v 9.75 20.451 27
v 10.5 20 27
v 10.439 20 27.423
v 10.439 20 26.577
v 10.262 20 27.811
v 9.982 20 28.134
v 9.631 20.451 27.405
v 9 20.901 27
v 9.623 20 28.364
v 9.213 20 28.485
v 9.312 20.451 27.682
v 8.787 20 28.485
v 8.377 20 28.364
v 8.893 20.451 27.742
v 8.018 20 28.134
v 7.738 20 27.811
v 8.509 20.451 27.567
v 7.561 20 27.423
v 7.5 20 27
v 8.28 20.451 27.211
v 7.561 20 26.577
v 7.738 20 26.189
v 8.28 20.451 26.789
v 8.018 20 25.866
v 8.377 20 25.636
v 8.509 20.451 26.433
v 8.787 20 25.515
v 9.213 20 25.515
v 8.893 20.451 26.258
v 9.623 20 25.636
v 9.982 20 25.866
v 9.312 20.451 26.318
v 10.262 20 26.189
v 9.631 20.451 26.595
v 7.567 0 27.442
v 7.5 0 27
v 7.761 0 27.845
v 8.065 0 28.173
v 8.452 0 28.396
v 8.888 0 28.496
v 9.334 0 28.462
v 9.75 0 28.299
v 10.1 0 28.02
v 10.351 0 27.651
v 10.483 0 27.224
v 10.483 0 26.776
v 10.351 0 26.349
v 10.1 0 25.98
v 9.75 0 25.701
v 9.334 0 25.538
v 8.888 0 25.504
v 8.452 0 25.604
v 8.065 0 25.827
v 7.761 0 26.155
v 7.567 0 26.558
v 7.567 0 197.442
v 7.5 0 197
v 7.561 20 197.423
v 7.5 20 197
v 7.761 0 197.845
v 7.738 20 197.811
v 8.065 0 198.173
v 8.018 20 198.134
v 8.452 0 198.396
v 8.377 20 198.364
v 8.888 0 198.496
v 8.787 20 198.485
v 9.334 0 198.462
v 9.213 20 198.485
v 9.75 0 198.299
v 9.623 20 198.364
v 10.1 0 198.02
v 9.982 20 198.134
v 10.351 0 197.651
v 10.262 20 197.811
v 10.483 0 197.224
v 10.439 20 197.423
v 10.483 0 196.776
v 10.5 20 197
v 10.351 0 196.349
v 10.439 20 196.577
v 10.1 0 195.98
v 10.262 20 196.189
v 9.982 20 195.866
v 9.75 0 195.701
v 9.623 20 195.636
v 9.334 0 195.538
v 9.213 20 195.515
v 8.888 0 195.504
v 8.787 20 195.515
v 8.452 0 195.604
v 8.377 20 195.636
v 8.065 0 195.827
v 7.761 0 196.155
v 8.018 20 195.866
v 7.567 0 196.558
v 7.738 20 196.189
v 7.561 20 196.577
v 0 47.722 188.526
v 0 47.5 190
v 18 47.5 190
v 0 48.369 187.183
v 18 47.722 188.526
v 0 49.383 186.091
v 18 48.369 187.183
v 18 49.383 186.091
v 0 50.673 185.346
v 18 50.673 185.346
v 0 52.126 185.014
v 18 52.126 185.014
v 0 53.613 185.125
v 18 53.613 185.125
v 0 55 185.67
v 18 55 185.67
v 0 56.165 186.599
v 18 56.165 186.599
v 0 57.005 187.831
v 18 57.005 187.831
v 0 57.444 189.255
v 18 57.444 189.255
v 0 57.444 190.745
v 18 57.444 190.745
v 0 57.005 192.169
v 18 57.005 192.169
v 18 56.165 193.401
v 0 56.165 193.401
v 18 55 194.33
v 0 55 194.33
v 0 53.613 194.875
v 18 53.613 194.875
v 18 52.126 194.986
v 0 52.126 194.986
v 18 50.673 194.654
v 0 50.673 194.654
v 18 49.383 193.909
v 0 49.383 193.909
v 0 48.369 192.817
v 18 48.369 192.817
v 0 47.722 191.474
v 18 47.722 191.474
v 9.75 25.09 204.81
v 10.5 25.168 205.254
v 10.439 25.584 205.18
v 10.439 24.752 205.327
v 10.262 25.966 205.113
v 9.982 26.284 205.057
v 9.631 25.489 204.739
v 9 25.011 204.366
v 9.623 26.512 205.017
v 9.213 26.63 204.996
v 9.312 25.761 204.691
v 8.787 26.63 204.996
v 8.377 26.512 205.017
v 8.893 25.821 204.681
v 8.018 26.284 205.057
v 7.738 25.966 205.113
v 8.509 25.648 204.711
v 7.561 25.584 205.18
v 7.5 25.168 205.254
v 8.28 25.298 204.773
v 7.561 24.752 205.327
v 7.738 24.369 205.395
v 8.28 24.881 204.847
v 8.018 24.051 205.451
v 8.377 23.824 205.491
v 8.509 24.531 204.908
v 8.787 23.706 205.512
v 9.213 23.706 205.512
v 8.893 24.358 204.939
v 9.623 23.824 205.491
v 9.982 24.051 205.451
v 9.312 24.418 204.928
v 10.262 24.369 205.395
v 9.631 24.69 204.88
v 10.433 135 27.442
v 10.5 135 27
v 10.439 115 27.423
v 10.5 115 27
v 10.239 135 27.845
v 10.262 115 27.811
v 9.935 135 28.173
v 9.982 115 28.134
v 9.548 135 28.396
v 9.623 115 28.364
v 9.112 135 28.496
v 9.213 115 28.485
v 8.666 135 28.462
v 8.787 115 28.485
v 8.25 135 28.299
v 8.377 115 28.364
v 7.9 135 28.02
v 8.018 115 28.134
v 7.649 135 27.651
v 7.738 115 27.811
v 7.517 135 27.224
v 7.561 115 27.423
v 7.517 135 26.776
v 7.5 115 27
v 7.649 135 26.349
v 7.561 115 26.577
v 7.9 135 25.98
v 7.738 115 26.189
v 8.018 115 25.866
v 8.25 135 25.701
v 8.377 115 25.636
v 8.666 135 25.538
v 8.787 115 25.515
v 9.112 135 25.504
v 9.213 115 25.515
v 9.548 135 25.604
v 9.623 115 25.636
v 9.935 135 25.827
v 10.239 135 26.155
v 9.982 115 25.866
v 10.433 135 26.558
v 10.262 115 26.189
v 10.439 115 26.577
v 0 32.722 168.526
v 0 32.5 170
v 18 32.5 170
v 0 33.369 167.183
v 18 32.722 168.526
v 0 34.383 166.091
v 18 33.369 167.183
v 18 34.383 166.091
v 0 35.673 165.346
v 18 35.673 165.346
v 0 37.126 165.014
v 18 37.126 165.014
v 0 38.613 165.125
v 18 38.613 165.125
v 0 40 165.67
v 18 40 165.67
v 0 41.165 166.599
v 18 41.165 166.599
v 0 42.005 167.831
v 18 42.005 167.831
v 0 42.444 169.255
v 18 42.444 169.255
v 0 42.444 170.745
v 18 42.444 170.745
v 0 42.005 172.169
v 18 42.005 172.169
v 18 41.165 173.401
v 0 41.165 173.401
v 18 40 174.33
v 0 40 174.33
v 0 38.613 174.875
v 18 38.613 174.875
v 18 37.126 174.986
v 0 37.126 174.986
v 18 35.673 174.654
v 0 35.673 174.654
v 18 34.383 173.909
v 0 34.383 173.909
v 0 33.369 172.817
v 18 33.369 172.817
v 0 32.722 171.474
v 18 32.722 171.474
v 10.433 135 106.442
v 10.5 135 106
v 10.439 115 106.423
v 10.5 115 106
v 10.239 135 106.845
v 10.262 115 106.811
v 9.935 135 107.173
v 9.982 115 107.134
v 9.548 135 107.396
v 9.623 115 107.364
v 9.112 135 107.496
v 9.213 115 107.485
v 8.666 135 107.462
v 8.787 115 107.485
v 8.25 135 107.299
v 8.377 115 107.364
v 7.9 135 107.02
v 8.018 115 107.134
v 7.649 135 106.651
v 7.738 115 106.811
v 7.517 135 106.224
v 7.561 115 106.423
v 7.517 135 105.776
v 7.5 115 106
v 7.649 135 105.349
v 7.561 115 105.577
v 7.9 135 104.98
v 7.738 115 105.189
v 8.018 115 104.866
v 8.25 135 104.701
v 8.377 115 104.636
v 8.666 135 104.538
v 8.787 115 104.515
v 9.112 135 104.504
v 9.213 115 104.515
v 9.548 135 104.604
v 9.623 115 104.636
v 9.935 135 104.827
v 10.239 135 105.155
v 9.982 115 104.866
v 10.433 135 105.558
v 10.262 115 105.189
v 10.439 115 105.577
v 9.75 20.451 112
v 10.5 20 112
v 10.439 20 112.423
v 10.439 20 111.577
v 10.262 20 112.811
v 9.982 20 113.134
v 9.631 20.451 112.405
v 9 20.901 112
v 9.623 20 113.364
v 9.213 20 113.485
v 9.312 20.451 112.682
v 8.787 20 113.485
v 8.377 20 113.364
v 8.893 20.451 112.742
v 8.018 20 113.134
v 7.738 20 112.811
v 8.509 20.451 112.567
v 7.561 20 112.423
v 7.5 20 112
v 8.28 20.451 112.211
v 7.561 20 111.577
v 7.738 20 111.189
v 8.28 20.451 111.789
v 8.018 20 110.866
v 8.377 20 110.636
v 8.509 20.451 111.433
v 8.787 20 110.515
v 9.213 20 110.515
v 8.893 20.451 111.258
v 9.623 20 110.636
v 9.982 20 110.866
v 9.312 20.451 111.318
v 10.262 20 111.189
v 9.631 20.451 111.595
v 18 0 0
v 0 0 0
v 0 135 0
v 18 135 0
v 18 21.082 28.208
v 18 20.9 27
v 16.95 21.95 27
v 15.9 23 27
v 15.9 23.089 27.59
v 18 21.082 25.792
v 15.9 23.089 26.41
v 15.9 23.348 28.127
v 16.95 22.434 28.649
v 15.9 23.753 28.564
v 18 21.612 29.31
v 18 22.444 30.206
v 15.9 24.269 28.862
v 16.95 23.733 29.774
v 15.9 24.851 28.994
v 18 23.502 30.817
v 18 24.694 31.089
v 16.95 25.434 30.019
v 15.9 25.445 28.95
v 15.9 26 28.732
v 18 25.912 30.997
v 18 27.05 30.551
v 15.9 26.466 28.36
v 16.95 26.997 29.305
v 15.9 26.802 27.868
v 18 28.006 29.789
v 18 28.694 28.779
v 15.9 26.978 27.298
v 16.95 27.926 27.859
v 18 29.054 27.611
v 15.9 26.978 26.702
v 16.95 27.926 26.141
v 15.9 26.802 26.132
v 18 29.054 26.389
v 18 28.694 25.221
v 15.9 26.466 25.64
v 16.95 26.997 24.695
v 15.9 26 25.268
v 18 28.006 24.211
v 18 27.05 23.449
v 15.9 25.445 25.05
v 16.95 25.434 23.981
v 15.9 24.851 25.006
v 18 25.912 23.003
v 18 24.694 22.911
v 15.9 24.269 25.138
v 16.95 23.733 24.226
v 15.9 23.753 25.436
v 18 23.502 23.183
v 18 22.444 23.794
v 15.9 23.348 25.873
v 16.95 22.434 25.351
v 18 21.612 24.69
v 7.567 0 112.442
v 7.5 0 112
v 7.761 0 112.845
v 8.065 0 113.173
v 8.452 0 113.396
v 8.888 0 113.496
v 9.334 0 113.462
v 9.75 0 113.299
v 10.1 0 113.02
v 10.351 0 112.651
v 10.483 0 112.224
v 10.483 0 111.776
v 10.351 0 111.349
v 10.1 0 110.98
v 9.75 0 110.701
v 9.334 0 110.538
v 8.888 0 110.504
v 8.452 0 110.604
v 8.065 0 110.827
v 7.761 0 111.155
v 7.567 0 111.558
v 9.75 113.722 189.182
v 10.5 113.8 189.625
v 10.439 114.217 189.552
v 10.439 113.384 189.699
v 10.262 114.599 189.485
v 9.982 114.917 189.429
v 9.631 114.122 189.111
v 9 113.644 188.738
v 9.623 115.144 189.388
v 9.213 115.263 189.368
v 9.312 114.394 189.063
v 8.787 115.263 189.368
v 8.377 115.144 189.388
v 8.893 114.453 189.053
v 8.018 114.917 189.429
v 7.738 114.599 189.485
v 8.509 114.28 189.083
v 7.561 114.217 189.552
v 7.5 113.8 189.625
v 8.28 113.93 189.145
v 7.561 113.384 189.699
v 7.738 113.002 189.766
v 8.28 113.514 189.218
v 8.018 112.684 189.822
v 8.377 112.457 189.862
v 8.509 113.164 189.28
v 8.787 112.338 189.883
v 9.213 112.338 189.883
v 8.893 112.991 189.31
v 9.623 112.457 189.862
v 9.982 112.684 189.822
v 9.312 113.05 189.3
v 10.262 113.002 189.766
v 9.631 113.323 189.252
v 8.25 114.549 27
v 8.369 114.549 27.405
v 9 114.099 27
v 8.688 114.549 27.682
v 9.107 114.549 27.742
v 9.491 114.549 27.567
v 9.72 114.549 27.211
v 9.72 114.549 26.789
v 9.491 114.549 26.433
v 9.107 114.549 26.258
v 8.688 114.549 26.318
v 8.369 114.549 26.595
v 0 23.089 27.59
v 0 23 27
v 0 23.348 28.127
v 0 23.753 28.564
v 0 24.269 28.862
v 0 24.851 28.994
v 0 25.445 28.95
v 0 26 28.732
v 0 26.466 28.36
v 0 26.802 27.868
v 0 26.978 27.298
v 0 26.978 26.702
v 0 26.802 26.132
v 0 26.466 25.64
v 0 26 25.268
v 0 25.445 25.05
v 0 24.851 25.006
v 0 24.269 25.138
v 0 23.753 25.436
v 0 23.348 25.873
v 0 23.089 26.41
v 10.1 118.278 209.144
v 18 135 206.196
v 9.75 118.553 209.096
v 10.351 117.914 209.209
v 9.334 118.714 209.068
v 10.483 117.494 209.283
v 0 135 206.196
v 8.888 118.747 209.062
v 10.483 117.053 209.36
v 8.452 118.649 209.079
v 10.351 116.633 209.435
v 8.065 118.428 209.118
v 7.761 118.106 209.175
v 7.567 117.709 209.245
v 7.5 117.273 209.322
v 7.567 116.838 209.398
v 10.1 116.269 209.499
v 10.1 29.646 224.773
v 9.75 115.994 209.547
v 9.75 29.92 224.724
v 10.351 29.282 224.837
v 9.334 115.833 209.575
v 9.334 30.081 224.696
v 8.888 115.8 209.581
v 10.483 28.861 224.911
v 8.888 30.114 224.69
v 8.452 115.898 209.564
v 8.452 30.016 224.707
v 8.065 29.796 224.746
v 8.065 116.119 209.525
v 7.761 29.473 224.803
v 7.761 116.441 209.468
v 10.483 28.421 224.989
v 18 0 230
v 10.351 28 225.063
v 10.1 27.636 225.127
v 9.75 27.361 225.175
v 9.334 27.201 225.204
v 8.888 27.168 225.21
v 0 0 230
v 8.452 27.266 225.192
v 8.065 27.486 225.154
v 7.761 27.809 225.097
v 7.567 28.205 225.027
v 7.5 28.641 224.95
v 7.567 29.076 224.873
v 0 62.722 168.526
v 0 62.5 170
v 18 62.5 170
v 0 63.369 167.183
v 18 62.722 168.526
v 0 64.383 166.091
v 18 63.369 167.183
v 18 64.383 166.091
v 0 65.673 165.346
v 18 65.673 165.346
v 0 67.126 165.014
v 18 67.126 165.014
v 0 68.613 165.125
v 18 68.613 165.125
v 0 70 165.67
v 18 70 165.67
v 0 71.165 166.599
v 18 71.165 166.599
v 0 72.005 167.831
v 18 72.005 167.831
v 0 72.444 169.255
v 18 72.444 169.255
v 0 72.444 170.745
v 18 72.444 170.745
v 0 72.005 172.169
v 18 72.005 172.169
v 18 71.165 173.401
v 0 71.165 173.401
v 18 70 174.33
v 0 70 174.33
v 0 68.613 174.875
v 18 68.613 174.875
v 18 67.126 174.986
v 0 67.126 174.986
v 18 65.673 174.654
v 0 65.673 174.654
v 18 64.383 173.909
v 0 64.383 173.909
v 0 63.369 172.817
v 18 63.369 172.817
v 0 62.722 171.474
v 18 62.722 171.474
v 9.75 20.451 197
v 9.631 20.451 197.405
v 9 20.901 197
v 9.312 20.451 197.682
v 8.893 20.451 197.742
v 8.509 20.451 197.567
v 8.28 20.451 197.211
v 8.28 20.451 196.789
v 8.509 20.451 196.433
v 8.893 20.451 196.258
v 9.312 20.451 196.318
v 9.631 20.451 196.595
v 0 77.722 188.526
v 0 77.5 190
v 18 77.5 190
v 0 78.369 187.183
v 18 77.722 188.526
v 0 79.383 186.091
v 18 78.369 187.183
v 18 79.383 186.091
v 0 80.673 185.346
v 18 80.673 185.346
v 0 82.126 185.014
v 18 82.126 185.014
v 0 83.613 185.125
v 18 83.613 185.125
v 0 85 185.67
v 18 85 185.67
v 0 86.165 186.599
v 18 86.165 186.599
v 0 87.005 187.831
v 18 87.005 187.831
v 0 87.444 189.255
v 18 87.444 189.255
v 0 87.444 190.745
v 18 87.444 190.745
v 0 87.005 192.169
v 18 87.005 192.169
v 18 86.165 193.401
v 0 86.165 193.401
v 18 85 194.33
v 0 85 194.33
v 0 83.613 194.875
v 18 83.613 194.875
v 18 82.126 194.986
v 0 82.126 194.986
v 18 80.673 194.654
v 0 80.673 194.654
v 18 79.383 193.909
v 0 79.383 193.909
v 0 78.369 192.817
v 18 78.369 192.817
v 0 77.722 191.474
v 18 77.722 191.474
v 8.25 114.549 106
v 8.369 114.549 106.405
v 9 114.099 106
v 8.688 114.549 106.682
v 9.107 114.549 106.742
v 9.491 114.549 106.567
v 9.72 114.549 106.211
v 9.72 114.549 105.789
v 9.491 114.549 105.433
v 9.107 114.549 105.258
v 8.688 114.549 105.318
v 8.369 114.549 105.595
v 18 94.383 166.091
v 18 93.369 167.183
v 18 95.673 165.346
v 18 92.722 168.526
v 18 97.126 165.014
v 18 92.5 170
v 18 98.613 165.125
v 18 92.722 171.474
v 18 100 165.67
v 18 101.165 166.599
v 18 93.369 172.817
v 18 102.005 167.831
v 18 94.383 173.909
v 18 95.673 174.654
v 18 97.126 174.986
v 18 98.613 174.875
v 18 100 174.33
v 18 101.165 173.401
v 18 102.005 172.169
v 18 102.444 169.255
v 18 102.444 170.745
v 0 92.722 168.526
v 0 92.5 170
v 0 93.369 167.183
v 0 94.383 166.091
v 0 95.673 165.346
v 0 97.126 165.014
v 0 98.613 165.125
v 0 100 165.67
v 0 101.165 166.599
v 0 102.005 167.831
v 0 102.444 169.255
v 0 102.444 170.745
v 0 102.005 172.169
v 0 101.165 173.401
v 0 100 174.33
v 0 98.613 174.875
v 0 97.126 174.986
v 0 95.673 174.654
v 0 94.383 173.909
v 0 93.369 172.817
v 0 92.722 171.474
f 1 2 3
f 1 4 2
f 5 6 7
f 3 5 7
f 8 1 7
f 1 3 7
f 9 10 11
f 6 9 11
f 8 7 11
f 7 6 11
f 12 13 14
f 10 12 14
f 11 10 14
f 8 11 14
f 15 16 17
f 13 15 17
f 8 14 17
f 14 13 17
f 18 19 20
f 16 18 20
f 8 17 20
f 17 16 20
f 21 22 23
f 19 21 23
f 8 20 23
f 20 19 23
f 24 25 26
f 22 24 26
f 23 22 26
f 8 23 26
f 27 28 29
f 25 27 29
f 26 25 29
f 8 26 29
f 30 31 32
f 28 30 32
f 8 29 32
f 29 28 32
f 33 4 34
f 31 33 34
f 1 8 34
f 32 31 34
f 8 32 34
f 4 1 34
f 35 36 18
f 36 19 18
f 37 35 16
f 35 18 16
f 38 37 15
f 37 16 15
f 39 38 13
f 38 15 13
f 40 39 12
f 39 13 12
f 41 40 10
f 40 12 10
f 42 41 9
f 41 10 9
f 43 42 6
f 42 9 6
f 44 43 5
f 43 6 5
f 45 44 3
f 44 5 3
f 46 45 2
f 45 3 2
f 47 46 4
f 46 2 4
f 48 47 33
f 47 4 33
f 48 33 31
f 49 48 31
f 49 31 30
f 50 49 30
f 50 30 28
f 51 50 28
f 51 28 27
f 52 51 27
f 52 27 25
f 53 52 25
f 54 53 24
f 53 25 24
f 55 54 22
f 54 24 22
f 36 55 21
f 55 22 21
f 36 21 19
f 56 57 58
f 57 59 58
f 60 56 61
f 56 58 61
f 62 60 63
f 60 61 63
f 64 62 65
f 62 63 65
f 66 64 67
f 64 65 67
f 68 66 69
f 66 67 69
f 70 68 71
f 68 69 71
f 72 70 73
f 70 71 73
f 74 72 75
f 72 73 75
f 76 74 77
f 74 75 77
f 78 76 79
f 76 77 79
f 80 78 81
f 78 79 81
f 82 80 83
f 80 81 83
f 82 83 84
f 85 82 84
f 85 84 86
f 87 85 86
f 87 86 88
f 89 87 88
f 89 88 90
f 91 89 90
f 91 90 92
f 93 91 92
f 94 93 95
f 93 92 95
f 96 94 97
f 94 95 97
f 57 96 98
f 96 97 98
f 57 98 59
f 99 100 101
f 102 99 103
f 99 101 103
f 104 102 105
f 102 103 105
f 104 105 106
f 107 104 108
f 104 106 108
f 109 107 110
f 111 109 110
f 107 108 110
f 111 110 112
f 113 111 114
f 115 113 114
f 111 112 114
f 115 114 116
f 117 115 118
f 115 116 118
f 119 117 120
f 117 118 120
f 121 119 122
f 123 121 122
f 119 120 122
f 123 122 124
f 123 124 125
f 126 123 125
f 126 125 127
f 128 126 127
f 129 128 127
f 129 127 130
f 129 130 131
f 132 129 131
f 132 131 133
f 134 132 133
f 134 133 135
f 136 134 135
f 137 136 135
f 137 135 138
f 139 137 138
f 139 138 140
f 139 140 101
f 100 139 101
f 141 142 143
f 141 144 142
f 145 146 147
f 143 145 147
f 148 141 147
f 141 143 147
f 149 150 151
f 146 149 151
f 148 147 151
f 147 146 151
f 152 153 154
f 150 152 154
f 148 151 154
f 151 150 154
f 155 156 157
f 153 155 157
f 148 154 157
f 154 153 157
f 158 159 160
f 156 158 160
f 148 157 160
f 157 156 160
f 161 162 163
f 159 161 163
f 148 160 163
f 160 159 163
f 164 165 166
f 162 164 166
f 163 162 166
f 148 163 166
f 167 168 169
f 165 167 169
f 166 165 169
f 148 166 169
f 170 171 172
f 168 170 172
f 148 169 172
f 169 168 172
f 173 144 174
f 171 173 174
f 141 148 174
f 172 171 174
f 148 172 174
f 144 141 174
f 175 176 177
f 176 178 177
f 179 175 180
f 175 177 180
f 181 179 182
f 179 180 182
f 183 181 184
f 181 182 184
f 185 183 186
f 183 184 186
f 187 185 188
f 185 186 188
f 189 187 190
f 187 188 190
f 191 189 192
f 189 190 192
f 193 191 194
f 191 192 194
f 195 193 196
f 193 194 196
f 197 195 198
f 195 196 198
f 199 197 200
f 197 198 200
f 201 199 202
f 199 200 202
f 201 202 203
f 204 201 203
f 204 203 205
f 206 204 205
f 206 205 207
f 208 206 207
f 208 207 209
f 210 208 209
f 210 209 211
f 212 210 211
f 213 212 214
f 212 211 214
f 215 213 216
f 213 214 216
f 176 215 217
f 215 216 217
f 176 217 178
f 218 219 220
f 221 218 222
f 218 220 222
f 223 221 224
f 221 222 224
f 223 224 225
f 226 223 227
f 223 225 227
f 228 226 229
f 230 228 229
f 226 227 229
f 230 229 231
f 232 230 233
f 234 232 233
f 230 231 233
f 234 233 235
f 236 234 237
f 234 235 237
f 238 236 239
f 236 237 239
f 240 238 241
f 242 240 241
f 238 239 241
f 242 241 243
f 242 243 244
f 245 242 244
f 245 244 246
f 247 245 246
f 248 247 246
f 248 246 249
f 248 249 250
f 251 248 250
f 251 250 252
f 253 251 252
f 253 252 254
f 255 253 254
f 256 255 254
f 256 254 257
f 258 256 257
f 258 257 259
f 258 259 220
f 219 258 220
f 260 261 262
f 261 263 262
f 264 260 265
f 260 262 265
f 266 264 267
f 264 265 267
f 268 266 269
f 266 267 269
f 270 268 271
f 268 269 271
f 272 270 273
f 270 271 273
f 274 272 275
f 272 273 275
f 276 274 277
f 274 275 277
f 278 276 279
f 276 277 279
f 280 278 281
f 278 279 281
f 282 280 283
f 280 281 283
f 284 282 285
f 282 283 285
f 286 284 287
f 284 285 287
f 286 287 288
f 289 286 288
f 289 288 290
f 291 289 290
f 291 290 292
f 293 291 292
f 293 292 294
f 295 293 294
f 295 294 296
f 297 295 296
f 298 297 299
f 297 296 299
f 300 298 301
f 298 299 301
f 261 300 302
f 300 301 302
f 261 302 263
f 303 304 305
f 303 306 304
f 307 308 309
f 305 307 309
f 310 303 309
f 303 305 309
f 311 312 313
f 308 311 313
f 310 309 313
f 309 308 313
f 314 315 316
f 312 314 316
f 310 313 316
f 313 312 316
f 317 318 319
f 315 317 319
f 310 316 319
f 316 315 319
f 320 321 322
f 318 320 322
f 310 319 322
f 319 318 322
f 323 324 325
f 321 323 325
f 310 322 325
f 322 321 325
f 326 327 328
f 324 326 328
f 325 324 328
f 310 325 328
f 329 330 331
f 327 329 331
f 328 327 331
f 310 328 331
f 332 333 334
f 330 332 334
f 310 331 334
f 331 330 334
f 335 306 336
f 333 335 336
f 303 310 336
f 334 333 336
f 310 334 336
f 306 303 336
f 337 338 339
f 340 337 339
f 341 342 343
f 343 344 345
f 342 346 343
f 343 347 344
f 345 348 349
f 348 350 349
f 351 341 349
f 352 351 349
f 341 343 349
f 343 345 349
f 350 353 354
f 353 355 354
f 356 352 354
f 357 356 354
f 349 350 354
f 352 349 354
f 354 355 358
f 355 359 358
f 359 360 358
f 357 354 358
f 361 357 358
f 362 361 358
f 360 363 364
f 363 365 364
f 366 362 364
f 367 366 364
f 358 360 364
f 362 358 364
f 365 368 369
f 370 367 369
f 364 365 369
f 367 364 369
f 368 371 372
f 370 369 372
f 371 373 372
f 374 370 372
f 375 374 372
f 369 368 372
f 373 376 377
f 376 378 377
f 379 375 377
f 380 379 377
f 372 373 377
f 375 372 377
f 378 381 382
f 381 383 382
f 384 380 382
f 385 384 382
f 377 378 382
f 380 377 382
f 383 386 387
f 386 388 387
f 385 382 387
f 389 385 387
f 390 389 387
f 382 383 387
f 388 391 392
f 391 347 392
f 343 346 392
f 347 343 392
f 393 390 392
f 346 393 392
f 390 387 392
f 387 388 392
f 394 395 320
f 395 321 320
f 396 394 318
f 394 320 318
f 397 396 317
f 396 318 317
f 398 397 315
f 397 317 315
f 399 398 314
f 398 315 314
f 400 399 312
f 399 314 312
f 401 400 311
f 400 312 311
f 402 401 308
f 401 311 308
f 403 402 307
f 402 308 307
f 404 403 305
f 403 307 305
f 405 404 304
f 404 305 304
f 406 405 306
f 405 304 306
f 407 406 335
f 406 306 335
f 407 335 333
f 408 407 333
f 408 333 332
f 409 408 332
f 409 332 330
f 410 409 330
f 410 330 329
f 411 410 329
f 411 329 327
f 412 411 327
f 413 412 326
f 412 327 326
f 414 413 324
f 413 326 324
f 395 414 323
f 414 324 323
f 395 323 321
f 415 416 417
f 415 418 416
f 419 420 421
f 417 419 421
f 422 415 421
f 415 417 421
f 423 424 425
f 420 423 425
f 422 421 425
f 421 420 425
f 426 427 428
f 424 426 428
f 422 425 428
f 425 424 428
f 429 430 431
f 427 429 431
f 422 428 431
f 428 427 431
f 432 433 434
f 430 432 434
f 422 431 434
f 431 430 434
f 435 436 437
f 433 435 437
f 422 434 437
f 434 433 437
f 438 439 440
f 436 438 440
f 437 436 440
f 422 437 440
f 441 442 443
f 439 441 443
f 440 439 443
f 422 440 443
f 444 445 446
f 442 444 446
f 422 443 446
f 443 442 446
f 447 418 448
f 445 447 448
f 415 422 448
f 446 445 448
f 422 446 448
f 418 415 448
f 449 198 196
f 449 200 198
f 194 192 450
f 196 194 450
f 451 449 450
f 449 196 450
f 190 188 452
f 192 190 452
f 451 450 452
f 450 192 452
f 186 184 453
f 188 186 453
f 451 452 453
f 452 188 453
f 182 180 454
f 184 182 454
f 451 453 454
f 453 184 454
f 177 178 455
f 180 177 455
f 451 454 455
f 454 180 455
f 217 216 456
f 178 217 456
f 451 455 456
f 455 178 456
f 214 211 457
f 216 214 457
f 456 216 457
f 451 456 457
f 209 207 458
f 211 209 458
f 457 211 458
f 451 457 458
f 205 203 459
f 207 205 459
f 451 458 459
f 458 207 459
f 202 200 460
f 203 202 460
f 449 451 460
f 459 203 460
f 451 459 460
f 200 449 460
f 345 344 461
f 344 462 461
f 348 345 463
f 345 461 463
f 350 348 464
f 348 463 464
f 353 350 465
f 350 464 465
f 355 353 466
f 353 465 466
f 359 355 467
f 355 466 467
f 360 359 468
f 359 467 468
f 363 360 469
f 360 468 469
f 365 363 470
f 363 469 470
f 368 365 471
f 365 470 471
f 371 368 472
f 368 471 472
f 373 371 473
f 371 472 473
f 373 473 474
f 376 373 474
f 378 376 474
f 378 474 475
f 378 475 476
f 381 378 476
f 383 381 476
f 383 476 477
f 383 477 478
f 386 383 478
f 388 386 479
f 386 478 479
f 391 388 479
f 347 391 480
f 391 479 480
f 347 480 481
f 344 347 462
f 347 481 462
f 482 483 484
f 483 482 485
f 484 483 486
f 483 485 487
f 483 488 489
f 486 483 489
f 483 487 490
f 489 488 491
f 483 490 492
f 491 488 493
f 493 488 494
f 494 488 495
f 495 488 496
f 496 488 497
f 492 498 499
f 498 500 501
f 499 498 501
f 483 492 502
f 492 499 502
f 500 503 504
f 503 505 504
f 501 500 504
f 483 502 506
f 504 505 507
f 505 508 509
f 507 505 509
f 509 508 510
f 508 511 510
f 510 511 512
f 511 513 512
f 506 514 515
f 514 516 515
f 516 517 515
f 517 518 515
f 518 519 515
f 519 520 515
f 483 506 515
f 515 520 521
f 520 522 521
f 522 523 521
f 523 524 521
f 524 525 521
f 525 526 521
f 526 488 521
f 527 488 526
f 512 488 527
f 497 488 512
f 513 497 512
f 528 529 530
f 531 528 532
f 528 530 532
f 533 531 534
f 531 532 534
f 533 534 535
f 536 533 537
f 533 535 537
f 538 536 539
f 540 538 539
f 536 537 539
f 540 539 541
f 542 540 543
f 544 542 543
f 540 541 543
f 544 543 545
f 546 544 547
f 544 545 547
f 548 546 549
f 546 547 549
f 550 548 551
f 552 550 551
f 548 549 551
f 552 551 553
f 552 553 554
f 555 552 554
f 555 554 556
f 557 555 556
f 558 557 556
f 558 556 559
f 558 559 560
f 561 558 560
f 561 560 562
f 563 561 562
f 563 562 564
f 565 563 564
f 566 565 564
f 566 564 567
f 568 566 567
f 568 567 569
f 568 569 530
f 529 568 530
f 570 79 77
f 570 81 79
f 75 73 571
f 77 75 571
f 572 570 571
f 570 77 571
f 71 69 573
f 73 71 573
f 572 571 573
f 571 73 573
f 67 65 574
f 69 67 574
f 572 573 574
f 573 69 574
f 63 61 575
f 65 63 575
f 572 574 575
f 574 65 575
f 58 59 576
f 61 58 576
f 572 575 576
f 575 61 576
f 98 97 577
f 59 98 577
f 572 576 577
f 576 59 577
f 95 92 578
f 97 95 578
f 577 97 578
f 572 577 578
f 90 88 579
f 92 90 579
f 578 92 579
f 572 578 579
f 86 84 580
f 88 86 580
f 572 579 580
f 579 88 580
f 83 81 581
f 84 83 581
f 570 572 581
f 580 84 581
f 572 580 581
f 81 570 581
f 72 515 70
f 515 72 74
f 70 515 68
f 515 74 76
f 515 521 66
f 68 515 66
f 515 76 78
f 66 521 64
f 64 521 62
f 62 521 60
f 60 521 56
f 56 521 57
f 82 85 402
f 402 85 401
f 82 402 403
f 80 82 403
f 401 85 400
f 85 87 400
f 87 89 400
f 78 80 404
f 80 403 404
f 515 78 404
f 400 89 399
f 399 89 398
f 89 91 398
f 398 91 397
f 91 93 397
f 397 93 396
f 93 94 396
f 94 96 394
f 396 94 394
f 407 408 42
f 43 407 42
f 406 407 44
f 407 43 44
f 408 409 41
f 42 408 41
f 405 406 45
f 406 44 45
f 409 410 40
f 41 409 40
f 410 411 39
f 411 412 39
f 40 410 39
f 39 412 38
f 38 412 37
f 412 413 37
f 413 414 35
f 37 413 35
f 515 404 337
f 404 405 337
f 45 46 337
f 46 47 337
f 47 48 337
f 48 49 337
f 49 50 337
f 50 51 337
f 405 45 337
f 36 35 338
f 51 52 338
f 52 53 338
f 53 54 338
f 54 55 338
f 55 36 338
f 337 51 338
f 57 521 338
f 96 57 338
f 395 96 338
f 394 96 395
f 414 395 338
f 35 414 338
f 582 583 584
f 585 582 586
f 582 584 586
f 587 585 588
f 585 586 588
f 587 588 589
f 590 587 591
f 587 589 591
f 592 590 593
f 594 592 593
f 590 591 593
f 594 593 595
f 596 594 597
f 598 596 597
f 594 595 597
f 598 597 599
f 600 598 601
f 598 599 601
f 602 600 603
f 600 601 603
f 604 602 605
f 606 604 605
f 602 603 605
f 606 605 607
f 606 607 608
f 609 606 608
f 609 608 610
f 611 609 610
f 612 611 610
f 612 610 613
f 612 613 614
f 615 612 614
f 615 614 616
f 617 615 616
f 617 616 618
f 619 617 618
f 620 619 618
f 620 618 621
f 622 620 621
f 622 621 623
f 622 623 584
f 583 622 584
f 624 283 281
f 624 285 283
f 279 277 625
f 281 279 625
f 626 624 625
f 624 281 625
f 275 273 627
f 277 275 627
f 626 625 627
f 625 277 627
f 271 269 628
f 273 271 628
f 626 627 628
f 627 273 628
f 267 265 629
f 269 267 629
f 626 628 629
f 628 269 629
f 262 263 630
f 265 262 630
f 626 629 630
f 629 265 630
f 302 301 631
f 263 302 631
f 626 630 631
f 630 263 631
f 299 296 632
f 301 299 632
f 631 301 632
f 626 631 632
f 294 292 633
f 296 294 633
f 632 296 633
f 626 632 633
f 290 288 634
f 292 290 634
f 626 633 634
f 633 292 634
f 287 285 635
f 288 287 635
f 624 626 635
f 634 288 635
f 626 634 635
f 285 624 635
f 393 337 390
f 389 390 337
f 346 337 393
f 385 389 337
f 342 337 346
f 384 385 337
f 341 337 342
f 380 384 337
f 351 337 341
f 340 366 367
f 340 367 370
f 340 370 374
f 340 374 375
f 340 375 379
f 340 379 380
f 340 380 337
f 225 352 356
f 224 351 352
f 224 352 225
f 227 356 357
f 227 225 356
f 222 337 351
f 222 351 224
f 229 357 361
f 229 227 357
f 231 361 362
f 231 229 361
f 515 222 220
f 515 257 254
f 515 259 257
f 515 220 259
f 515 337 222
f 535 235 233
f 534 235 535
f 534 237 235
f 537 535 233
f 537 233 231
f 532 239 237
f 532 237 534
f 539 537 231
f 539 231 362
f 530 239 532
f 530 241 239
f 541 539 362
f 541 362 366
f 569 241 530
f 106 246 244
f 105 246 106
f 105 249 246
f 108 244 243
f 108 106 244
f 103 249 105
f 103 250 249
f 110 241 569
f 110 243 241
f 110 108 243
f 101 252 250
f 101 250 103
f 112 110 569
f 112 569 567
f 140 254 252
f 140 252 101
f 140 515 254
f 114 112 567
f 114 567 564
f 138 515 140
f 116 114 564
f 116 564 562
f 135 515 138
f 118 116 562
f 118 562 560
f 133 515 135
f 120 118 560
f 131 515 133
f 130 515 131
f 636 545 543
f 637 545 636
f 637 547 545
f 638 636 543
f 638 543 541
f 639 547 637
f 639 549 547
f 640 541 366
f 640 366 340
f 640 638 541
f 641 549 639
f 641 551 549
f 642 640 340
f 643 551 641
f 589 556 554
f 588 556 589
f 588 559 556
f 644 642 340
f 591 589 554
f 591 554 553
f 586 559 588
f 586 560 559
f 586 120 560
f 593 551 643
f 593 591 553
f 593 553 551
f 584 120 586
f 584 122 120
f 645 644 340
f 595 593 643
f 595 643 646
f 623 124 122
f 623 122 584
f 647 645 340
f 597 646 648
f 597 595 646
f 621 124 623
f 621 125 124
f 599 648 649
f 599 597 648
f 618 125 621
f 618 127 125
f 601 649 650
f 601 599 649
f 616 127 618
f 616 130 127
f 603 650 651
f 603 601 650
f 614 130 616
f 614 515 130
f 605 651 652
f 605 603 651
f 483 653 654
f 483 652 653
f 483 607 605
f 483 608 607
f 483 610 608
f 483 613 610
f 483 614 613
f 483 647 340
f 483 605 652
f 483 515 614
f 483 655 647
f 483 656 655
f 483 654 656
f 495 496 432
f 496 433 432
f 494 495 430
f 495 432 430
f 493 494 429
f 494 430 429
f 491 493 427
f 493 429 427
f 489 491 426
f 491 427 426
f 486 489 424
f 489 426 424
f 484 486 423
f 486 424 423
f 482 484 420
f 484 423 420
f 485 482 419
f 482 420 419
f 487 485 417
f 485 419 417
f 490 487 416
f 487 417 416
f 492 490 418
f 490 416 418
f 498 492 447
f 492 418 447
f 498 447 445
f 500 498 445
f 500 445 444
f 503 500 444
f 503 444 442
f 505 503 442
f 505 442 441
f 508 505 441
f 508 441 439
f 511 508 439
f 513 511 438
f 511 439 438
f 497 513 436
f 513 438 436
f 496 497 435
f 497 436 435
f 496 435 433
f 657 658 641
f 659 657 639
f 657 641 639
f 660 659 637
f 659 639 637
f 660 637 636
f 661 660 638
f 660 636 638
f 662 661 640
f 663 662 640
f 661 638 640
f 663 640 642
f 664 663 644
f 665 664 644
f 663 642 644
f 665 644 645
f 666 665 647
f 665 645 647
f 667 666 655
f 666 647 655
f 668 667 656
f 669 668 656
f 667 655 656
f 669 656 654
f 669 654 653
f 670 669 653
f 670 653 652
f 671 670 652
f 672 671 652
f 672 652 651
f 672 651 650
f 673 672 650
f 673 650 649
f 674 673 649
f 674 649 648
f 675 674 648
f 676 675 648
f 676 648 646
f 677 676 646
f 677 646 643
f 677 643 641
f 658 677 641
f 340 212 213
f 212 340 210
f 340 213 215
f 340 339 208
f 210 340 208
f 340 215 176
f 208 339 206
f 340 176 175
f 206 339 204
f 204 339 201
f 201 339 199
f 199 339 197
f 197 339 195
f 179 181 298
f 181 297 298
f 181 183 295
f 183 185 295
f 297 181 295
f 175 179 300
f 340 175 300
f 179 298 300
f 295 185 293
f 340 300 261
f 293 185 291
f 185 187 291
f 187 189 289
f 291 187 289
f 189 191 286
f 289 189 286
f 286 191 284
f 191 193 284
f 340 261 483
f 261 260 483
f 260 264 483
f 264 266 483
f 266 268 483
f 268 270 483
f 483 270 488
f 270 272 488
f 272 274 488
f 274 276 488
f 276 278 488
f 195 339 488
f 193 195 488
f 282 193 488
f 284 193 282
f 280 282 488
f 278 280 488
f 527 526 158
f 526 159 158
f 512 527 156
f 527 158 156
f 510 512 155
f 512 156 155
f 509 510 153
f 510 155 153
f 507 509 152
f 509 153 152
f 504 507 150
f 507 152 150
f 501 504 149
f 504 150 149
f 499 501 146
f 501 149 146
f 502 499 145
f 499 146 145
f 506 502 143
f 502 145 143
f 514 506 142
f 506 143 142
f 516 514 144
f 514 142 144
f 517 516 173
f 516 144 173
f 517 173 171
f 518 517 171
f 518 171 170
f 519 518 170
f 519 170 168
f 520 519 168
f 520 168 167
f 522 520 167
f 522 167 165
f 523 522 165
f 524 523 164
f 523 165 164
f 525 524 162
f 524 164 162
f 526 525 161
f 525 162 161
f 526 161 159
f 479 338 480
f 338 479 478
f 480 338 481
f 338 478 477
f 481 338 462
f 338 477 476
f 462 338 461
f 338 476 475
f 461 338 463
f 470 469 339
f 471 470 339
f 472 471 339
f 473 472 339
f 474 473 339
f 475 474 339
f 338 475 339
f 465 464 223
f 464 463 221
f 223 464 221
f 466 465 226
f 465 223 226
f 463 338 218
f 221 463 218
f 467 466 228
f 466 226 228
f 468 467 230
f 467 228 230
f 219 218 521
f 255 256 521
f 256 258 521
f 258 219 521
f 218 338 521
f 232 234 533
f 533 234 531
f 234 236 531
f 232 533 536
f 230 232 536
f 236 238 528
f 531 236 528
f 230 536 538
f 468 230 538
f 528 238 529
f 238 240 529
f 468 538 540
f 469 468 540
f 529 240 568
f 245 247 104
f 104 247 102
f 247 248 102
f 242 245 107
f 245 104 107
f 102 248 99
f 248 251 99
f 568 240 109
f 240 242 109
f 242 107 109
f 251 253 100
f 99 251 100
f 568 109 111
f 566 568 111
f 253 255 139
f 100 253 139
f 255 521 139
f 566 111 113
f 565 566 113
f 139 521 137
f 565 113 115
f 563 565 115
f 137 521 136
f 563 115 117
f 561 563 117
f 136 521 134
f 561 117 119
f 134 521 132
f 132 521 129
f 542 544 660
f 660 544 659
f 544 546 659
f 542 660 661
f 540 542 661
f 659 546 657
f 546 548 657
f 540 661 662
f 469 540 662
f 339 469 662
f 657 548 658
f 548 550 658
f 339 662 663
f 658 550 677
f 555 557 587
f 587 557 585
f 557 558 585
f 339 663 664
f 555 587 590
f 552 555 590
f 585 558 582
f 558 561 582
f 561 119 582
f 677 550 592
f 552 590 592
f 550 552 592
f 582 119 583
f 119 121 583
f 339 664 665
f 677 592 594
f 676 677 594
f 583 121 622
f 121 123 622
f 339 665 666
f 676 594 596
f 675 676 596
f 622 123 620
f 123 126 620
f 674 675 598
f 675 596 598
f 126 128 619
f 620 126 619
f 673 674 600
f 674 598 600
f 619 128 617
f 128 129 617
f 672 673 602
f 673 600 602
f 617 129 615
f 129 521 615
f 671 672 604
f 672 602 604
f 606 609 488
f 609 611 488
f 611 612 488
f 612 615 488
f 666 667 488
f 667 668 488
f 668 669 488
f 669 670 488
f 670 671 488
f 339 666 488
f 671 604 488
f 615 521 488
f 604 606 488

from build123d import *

# Parameters (mm, degrees)
F1_DEPTH       = 18
F2_D           = 10
F3_D           = 10
F5_D           = 4
F5_CSINK_D     = 8.2
F5_CSINK_ANGLE = 90
F7_D           = 3
F7_DEPTH       = 20
F7_TIP         = 0.9012909285
F9_D           = 3
F9_DEPTH       = 20
F9_TIP         = 0.9012909285
F11_D          = 3
F11_DEPTH      = 20
F11_TIP        = 0.9012909285


# Not quite as in the source:
# - a feature names something its author has since deleted; it is built from what else it names


with BuildPart() as f1:
    # F0 (on Right) → F1 (new body)
    with BuildSketch(Plane.YZ):
        Polygon((0, 230), (0, 0), (135, 0), (135, 206.1958576044), align=None)
    extrude(amount=F1_DEPTH)

    # F2 (through all)
    with Locations(Plane(origin=(0, 0, 0), x_dir=(0, 1, 0), z_dir=(-1, 0, 0))):
        with Locations((37.5, -170), (67.5, -170), (97.5, -170)):
            Hole(F2_D / 2)

    # F3 (through all)
    with Locations(Plane(origin=(0, 0, 0), x_dir=(0, 1, 0), z_dir=(-1, 0, 0))):
        with Locations((52.5, -190), (82.5, -190)):
            Hole(F3_D / 2)

    # F5 (through all)
    with Locations(Plane.YZ.offset(18)):
        with Locations((25, 27)):
            CounterSinkHole(F5_D / 2, F5_CSINK_D / 2, counter_sink_angle=F5_CSINK_ANGLE)

    # F7
    with Locations(Plane(origin=(0, 135, 0), x_dir=(-1, 0, 0), z_dir=(0, 1, 0))):
        with Locations((-9, 27), (-9, 106)):
            Hole(F7_D / 2, depth=F7_DEPTH)
            with Locations((0, 0, -(F7_DEPTH + F7_TIP / 2))):  # 118° drill point
                Cone(0, F7_D / 2, F7_TIP, mode=Mode.SUBTRACT)

    # F9
    with Locations(Plane.XZ):
        with Locations((9, 197), (9, 112), (9, 27)):
            Hole(F9_D / 2, depth=F9_DEPTH)
            with Locations((0, 0, -(F9_DEPTH + F9_TIP / 2))):  # 118° drill point
                Cone(0, F9_D / 2, F9_TIP, mode=Mode.SUBTRACT)

    # F11
    with Locations(Plane(origin=(0, 39.3323164825, 223.0646513904), x_dir=(1, 0, 0), z_dir=(0, 0.1736481777, 0.984807753))):
        with Locations((9, -10.8564882588), (9, 79.1435117412)):
            Hole(F11_D / 2, depth=F11_DEPTH)
            with Locations((0, 0, -(F11_DEPTH + F11_TIP / 2))):  # 118° drill point
                Cone(0, F11_D / 2, F11_TIP, mode=Mode.SUBTRACT)


solid = f1.part
